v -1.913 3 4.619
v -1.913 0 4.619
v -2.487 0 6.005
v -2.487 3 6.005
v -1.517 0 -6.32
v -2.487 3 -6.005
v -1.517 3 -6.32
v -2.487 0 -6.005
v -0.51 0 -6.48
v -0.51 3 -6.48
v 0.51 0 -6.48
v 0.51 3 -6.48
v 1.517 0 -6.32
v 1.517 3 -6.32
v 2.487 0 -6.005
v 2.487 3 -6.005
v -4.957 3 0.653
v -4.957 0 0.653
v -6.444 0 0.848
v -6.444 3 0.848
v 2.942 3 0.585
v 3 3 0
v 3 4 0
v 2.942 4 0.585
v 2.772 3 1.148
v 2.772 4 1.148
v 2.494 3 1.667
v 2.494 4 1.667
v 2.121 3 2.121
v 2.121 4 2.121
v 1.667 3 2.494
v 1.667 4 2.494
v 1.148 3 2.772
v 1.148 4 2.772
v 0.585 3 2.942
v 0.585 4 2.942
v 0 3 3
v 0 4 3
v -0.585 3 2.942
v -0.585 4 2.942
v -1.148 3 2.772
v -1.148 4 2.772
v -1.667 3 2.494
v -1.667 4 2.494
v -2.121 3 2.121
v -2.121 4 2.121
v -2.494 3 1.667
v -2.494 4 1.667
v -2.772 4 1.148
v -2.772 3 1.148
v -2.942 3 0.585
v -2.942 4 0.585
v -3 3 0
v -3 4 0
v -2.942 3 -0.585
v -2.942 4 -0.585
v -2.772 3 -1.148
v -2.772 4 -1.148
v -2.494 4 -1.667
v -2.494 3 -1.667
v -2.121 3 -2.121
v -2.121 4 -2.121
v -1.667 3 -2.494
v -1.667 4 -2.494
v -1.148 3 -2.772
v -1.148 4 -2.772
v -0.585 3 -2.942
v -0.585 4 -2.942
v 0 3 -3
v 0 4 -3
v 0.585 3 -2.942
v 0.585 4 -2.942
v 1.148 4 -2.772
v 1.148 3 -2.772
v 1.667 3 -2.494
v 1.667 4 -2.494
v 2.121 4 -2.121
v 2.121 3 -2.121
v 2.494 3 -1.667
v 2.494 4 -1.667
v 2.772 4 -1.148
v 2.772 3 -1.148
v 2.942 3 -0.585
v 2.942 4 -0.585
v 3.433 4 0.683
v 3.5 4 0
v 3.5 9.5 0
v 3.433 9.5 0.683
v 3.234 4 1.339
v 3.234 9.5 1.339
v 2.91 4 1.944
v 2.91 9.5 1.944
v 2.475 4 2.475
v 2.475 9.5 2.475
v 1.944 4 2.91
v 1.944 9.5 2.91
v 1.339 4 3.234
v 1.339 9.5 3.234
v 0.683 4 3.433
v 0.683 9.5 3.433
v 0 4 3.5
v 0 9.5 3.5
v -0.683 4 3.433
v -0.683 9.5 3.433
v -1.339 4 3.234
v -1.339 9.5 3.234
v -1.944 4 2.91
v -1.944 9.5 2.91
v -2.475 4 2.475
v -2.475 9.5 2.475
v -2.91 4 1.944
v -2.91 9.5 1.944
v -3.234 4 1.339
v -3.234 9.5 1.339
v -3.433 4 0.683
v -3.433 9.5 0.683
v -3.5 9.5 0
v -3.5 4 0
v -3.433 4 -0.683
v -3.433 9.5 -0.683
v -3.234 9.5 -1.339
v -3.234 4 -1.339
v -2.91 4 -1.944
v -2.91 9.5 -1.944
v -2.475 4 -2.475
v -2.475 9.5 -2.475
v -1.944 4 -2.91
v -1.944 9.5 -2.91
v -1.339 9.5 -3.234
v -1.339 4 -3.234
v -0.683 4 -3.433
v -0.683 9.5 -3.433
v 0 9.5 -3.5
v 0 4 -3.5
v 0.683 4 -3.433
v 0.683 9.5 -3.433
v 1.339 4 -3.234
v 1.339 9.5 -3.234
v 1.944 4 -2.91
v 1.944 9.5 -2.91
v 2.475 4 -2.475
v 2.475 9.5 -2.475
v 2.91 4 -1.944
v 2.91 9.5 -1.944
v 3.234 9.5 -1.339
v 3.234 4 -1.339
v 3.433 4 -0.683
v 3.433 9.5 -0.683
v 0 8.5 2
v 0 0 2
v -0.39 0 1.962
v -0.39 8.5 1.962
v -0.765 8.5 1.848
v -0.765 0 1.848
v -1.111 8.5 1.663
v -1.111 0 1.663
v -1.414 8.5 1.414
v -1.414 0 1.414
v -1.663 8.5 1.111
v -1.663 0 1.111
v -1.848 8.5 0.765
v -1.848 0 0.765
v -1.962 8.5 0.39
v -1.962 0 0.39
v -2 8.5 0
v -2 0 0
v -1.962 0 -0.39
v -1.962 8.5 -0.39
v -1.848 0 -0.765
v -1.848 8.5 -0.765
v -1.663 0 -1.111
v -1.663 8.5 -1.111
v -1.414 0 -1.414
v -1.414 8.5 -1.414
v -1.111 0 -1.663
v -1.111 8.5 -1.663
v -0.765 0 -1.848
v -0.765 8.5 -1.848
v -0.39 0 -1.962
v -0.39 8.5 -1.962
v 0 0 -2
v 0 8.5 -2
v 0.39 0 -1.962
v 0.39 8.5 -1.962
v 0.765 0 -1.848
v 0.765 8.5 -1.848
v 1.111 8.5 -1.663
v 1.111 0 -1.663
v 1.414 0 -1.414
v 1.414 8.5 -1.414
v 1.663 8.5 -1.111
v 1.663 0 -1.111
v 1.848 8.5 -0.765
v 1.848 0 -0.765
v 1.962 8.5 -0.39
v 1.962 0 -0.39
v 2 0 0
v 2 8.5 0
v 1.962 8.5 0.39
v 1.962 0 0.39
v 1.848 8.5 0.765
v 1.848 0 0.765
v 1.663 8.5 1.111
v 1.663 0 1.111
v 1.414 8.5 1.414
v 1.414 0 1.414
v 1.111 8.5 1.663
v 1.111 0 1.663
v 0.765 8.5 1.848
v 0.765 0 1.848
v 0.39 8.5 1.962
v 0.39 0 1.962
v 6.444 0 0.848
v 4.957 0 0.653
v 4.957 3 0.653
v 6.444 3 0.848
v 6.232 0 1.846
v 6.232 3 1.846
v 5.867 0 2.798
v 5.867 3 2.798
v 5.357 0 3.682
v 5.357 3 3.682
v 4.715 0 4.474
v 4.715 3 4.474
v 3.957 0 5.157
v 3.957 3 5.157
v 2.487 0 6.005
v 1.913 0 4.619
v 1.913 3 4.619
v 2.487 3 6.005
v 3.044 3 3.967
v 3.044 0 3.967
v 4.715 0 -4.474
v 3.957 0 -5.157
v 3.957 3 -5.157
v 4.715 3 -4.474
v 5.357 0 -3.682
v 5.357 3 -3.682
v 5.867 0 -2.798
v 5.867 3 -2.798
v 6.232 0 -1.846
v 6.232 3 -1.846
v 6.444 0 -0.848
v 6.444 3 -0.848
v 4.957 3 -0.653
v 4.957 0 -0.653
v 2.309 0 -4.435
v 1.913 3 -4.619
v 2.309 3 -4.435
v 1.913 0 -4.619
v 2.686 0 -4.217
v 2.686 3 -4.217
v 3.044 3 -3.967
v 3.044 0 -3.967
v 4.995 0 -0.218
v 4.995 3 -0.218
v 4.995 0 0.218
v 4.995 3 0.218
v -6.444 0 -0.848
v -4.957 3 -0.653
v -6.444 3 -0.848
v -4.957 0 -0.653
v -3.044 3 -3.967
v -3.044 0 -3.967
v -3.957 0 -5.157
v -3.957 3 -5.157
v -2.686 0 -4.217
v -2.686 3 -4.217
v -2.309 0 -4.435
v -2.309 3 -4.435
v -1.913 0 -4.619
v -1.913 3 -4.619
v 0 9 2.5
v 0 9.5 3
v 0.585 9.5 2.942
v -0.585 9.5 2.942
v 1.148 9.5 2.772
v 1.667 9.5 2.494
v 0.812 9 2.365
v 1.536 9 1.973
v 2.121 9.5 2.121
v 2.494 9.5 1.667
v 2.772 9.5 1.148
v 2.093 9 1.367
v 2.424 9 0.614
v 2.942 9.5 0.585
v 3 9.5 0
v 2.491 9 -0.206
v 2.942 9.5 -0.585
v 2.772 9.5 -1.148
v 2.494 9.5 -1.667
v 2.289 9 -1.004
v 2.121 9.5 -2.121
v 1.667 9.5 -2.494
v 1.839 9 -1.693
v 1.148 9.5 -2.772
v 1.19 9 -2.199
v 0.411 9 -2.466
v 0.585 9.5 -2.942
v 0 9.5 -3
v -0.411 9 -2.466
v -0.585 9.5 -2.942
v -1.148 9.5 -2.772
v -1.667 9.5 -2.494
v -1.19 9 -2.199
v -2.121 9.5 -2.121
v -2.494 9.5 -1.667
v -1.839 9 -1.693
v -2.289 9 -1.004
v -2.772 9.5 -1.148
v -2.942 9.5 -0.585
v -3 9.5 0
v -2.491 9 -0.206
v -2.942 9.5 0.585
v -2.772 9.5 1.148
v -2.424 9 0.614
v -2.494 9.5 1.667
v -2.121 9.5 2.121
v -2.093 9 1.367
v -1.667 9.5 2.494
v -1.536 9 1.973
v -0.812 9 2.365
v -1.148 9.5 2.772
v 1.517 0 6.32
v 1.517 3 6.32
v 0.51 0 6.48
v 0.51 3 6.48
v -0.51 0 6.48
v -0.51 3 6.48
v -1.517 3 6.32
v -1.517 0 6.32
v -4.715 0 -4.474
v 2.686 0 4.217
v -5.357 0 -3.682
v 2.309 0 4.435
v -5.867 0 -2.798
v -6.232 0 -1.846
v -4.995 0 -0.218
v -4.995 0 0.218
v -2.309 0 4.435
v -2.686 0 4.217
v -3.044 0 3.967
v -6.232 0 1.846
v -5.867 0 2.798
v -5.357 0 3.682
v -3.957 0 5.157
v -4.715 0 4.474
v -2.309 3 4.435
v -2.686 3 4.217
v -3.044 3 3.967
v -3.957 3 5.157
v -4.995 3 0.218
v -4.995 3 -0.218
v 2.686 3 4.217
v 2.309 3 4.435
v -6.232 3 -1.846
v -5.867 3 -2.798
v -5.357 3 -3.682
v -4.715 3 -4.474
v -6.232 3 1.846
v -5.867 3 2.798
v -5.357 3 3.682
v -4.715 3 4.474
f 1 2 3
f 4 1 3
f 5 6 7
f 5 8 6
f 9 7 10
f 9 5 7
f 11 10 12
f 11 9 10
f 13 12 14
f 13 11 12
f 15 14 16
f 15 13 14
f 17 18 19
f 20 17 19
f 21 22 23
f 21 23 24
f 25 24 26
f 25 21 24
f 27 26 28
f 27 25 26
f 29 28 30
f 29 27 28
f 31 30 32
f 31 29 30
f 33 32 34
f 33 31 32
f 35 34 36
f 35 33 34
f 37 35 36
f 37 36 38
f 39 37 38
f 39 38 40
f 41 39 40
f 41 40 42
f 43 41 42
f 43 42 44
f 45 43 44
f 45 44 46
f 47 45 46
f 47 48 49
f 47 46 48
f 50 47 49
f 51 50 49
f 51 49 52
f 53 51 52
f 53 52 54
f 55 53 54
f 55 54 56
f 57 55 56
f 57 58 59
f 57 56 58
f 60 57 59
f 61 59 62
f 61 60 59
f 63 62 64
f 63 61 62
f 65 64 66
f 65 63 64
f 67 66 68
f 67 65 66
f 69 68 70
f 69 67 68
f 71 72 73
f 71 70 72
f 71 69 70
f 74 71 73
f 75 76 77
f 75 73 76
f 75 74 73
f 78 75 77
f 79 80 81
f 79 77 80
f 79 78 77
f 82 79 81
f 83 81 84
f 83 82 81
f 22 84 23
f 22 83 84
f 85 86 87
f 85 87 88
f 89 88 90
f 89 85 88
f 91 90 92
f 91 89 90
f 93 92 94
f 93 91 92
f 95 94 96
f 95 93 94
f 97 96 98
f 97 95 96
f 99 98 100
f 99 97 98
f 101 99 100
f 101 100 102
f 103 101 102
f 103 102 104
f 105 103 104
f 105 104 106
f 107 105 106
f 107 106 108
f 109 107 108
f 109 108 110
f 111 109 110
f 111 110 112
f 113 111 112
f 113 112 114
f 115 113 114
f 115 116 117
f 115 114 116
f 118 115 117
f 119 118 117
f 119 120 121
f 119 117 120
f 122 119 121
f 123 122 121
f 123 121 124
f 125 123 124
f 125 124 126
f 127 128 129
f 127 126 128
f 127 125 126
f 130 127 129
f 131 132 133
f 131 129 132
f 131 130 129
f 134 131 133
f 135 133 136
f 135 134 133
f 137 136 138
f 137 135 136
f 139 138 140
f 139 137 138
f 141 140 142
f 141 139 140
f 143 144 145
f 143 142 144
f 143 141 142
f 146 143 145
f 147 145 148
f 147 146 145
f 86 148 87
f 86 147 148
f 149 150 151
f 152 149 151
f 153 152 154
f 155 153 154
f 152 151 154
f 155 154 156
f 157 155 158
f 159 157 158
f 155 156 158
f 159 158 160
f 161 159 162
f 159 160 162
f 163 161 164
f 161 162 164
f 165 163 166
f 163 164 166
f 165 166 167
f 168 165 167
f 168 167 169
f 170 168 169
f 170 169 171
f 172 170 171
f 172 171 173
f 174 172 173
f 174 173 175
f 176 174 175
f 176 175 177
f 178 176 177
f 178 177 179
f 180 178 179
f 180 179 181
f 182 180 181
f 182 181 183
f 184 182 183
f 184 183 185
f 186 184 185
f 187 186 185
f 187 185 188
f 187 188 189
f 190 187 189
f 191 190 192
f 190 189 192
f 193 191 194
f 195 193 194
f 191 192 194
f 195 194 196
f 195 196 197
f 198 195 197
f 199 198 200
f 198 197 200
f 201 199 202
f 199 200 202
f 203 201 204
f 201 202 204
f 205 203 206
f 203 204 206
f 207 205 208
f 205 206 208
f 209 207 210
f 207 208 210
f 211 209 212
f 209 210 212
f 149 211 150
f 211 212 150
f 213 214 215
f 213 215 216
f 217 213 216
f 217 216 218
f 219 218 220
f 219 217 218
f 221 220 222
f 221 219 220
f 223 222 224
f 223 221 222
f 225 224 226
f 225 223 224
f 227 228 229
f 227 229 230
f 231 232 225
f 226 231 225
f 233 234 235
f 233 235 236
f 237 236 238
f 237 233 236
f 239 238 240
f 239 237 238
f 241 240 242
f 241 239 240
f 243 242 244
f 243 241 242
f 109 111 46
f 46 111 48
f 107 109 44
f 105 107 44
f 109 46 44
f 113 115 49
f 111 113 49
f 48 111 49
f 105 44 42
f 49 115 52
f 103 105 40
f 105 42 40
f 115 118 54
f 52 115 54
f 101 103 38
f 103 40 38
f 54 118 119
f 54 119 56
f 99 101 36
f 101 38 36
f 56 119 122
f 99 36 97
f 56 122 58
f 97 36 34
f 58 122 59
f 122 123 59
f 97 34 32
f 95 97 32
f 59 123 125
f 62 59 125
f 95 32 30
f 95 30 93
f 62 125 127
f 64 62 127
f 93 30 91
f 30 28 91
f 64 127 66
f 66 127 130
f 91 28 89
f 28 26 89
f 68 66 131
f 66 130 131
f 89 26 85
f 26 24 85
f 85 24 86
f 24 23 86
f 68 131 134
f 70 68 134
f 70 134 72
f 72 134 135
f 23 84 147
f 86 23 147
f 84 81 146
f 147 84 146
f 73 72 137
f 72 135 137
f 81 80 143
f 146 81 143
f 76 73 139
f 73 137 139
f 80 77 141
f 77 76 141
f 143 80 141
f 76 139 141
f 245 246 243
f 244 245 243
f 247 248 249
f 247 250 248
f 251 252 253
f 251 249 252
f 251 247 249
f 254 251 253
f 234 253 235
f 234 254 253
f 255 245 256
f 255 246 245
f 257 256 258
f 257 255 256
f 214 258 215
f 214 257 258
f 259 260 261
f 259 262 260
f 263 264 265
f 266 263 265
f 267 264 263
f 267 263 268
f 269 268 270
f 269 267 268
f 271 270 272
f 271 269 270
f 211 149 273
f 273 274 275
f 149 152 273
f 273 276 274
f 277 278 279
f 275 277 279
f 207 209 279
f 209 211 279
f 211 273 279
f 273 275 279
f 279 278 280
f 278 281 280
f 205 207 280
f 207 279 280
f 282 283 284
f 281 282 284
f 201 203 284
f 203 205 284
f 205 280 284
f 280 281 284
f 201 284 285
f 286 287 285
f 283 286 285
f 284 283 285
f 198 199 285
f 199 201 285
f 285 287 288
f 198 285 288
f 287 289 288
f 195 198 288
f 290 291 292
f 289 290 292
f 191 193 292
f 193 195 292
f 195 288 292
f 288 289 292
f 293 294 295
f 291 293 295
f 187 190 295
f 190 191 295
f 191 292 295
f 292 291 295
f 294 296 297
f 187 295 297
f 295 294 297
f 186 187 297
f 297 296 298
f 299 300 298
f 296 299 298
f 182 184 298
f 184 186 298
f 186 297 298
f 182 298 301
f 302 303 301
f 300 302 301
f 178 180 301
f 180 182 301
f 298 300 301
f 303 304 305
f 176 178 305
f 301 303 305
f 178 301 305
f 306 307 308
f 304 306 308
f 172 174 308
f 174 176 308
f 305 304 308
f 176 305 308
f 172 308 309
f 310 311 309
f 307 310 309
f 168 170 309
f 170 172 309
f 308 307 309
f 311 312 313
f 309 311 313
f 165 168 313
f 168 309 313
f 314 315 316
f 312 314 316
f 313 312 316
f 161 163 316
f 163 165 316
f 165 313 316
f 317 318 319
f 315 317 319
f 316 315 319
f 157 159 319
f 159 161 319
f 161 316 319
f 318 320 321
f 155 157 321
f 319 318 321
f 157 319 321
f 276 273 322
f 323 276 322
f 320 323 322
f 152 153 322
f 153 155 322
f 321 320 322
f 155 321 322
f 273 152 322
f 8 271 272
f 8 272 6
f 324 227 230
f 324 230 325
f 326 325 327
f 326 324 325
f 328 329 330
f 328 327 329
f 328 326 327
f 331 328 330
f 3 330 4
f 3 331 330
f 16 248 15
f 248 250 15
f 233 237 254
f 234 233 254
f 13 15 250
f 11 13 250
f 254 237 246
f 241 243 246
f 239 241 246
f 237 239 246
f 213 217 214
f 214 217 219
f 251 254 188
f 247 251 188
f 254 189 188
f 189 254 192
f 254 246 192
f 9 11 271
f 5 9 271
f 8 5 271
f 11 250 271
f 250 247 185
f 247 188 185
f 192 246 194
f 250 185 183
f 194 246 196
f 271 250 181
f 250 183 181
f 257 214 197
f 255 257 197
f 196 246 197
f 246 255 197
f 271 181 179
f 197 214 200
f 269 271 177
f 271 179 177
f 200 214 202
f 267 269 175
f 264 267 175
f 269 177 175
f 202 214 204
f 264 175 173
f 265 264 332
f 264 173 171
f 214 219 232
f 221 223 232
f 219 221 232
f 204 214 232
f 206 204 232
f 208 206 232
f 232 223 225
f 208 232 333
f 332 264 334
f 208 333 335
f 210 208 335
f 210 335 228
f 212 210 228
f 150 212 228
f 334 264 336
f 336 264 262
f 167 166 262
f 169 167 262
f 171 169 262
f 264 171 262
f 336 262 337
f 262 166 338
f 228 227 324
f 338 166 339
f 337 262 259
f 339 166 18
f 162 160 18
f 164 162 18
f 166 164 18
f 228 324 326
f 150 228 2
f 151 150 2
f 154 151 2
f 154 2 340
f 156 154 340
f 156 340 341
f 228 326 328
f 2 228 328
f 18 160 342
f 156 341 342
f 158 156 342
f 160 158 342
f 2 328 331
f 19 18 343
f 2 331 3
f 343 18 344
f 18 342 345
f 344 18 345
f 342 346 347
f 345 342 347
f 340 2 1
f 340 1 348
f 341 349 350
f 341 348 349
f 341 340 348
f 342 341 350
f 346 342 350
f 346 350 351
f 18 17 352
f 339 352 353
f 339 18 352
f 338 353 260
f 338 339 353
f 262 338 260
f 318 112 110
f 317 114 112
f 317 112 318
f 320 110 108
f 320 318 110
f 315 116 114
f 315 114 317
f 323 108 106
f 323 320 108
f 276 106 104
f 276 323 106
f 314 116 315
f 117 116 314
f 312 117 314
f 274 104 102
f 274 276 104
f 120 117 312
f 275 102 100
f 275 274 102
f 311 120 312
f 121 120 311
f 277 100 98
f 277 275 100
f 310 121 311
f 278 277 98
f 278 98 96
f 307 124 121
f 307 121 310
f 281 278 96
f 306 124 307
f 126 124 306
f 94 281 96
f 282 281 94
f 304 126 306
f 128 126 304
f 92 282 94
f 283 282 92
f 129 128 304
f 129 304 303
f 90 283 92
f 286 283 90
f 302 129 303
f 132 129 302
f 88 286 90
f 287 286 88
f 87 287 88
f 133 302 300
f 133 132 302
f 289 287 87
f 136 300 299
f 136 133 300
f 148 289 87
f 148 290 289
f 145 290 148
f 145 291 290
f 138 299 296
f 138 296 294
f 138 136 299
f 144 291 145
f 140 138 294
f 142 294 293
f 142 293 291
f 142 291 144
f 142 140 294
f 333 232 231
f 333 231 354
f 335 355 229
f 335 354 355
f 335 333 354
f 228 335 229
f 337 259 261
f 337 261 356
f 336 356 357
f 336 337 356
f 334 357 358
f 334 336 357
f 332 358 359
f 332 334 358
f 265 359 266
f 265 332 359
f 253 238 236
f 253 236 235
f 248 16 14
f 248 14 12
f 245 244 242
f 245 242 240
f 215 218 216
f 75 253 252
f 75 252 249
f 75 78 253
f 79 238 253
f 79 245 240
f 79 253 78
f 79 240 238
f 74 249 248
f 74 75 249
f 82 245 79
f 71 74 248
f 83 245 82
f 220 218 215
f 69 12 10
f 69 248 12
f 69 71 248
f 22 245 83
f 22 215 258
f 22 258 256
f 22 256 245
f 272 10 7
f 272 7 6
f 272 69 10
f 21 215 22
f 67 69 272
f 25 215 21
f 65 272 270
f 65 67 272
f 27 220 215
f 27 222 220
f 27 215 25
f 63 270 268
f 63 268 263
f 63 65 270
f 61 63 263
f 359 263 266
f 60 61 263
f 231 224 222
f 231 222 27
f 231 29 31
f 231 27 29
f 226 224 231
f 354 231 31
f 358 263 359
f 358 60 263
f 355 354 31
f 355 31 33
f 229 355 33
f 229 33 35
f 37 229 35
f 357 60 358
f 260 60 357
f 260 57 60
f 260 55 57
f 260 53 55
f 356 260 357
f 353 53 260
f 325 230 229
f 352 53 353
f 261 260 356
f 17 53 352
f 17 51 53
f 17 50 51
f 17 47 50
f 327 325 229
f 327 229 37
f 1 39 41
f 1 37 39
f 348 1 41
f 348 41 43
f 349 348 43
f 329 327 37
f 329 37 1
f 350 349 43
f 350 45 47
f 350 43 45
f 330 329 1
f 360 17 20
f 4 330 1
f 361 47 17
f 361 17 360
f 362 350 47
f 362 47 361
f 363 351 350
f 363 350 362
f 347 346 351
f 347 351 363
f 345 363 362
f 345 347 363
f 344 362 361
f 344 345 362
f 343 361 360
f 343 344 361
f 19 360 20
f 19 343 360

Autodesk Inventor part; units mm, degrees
ref_plane "YZ Plane" through (0, 0, 0) normal (1, 0, 0) x (0, 1, 0)
ref_plane "XZ Plane" through (0, 0, 0) normal (0, 1, 0) x (-1, 0, 0)
ref_plane "XY Plane" through (0, 0, 0) normal (0, 0, 1) x (1, 0, 0)
sketch "Sketch1" plane through (0, 0, 0) normal (0, 1, 0) x (-1, 0, 0)
  circle A0 centre (0, 0) radius 6.5
  arc A1 (4.9572, -0.6526) -> (4.9572, 0.6526) centre (0, 0) ccw
  line L0 (6.5, 0) -> (0, 0)
  line L1 (4.9572, -0.6526) -> (6.4979, -0.8555)
  line L2 (4.9572, 0.6526) -> (6.9401, 0.9137)
  line L3 (0, 0) -> (7, 0) construction
  line L4 (3.0438, 3.9668) -> (3.9898, 5.1996)
  arc A2 (3.0438, 3.9668) -> (1.9134, 4.6194) centre (0, 0) ccw
  line L5 (1.9134, 4.6194) -> (2.6788, 6.4672)
  line L6 (-1.9134, 4.6194) -> (-2.5081, 6.0551)
  arc A3 (-1.9134, 4.6194) -> (-3.0438, 3.9668) centre (0, 0) ccw
  line L7 (-3.0438, 3.9668) -> (-4.2613, 5.5535)
  line L8 (-4.9572, 0.6526) -> (-6.4979, 0.8555)
  arc A4 (-4.9572, 0.6526) -> (-4.9572, -0.6526) centre (0, 0) ccw
  line L9 (-4.9572, -0.6526) -> (-6.9401, -0.9137)
  line L10 (-3.0438, -3.9668) -> (-3.9898, -5.1996)
  arc A5 (-3.0438, -3.9668) -> (-1.9134, -4.6194) centre (0, 0) ccw
  line L11 (-1.9134, -4.6194) -> (-2.6788, -6.4672)
  line L12 (1.9134, -4.6194) -> (2.5081, -6.0551)
  arc A6 (1.9134, -4.6194) -> (3.0438, -3.9668) centre (0, 0) ccw
  line L13 (3.0438, -3.9668) -> (4.2613, -5.5535)
  point P0 (-6.4444, -0.8484)
  point P1 (-3.9569, -5.1568)
  point P2 (-2.4874, -6.0052)
  point P3 (2.4874, -6.0052)
  point P4 (3.9569, -5.1568)
  point P5 (6.4444, -0.8484)
  point P6 (6.4444, 0.8484)
  point P7 (3.9569, 5.1568)
  point P8 (2.4874, 6.0052)
  point P9 (-2.4874, 6.0052)
  point P10 (-3.9569, 5.1568)
  point P11 (-6.4444, 0.8484)
  dimension "d0" = 13
  dimension "d1" = 10
  dimension "d2" = 6.554
  dimension "d3" = 7.5
  dimension "d4" = 7
  dimension "d5" = 7.5
  dimension "d8" = 360
extrude "Extrusion1" add sketch "Sketch1" along normal blind 3 contours L2 A1 L1 A0 L13 A6 L12 L11 A5 L10 L9 A4 L8 L7 A3 L6 L5 A2 L4
sketch "Sketch2" plane through (0, 3, 0) normal (0, 1, 0) x (1, 0, 0)
  arc A0 (-2.4874, -6.0052) -> (2.4874, -6.0052) centre (0, 0) ccw projected
  line L0 (2.4874, -6.0052) -> (1.9134, -4.6194) projected
  arc A1 (1.9134, -4.6194) -> (3.0438, -3.9668) centre (0, 0) ccw projected
  line L1 (3.0438, -3.9668) -> (3.9569, -5.1568) projected
  arc A2 (3.9569, -5.1568) -> (6.4444, -0.8484) centre (0, 0) ccw projected
  line L2 (6.4444, -0.8484) -> (4.9572, -0.6526) projected
  arc A3 (4.9572, -0.6526) -> (4.9572, 0.6526) centre (0, 0) ccw projected
  line L3 (4.9572, 0.6526) -> (6.4444, 0.8484) projected
  arc A4 (6.4444, 0.8484) -> (3.9569, 5.1568) centre (0, 0) ccw projected
  line L4 (3.9569, 5.1568) -> (3.0438, 3.9668) projected
  arc A5 (3.0438, 3.9668) -> (1.9134, 4.6194) centre (0, 0) ccw projected
  line L5 (1.9134, 4.6194) -> (2.4874, 6.0052) projected
  arc A6 (2.4874, 6.0052) -> (-2.4874, 6.0052) centre (0, 0) ccw projected
  line L6 (-2.4874, 6.0052) -> (-1.9134, 4.6194) projected
  arc A7 (-1.9134, 4.6194) -> (-3.0438, 3.9668) centre (0, 0) ccw projected
  line L7 (-3.0438, 3.9668) -> (-3.9569, 5.1568) projected
  arc A8 (-3.9569, 5.1568) -> (-6.4444, 0.8484) centre (0, 0) ccw projected
  line L8 (-6.4444, 0.8484) -> (-4.9572, 0.6526) projected
  arc A9 (-4.9572, 0.6526) -> (-4.9572, -0.6526) centre (0, 0) ccw projected
  line L9 (-4.9572, -0.6526) -> (-6.4444, -0.8484) projected
  arc A10 (-6.4444, -0.8484) -> (-3.9569, -5.1568) centre (0, 0) ccw projected
  line L10 (-3.9569, -5.1568) -> (-3.0438, -3.9668) projected
  arc A11 (-3.0438, -3.9668) -> (-1.9134, -4.6194) centre (0, 0) ccw projected
  line L11 (-1.9134, -4.6194) -> (-2.4874, -6.0052) projected
  circle A12 centre (0, 0) radius 3
  dimension "d12" = 6
extrude "Extrusion2" add sketch "Sketch2" along normal blind 1 contours A12
sketch "Sketch3" plane through (0, 4, 0) normal (0, 1, 0) x (1, 0, 0)
  circle A0 centre (0, 0) radius 3.5
  dimension "d15" = 7
extrude "Extrusion3" add sketch "Sketch3" along normal blind 5.5
sketch "Sketch4" plane through (0, 9.5, 0) normal (0, 1, 0) x (1, 0, 0)
  point P0 (0, 0)
  point P1 (0, 0)
hole "Hole1" at (0, 9.5, 0) direction (0, -1, 0) diameter 4 end through all countersink diameter 6 countersink angle 90
thread "Thread1" size "M7x1" class "6g" standard "ANSI Metric M Profile" length 10
properties material "Brass, Soft Yellow, Welded"
